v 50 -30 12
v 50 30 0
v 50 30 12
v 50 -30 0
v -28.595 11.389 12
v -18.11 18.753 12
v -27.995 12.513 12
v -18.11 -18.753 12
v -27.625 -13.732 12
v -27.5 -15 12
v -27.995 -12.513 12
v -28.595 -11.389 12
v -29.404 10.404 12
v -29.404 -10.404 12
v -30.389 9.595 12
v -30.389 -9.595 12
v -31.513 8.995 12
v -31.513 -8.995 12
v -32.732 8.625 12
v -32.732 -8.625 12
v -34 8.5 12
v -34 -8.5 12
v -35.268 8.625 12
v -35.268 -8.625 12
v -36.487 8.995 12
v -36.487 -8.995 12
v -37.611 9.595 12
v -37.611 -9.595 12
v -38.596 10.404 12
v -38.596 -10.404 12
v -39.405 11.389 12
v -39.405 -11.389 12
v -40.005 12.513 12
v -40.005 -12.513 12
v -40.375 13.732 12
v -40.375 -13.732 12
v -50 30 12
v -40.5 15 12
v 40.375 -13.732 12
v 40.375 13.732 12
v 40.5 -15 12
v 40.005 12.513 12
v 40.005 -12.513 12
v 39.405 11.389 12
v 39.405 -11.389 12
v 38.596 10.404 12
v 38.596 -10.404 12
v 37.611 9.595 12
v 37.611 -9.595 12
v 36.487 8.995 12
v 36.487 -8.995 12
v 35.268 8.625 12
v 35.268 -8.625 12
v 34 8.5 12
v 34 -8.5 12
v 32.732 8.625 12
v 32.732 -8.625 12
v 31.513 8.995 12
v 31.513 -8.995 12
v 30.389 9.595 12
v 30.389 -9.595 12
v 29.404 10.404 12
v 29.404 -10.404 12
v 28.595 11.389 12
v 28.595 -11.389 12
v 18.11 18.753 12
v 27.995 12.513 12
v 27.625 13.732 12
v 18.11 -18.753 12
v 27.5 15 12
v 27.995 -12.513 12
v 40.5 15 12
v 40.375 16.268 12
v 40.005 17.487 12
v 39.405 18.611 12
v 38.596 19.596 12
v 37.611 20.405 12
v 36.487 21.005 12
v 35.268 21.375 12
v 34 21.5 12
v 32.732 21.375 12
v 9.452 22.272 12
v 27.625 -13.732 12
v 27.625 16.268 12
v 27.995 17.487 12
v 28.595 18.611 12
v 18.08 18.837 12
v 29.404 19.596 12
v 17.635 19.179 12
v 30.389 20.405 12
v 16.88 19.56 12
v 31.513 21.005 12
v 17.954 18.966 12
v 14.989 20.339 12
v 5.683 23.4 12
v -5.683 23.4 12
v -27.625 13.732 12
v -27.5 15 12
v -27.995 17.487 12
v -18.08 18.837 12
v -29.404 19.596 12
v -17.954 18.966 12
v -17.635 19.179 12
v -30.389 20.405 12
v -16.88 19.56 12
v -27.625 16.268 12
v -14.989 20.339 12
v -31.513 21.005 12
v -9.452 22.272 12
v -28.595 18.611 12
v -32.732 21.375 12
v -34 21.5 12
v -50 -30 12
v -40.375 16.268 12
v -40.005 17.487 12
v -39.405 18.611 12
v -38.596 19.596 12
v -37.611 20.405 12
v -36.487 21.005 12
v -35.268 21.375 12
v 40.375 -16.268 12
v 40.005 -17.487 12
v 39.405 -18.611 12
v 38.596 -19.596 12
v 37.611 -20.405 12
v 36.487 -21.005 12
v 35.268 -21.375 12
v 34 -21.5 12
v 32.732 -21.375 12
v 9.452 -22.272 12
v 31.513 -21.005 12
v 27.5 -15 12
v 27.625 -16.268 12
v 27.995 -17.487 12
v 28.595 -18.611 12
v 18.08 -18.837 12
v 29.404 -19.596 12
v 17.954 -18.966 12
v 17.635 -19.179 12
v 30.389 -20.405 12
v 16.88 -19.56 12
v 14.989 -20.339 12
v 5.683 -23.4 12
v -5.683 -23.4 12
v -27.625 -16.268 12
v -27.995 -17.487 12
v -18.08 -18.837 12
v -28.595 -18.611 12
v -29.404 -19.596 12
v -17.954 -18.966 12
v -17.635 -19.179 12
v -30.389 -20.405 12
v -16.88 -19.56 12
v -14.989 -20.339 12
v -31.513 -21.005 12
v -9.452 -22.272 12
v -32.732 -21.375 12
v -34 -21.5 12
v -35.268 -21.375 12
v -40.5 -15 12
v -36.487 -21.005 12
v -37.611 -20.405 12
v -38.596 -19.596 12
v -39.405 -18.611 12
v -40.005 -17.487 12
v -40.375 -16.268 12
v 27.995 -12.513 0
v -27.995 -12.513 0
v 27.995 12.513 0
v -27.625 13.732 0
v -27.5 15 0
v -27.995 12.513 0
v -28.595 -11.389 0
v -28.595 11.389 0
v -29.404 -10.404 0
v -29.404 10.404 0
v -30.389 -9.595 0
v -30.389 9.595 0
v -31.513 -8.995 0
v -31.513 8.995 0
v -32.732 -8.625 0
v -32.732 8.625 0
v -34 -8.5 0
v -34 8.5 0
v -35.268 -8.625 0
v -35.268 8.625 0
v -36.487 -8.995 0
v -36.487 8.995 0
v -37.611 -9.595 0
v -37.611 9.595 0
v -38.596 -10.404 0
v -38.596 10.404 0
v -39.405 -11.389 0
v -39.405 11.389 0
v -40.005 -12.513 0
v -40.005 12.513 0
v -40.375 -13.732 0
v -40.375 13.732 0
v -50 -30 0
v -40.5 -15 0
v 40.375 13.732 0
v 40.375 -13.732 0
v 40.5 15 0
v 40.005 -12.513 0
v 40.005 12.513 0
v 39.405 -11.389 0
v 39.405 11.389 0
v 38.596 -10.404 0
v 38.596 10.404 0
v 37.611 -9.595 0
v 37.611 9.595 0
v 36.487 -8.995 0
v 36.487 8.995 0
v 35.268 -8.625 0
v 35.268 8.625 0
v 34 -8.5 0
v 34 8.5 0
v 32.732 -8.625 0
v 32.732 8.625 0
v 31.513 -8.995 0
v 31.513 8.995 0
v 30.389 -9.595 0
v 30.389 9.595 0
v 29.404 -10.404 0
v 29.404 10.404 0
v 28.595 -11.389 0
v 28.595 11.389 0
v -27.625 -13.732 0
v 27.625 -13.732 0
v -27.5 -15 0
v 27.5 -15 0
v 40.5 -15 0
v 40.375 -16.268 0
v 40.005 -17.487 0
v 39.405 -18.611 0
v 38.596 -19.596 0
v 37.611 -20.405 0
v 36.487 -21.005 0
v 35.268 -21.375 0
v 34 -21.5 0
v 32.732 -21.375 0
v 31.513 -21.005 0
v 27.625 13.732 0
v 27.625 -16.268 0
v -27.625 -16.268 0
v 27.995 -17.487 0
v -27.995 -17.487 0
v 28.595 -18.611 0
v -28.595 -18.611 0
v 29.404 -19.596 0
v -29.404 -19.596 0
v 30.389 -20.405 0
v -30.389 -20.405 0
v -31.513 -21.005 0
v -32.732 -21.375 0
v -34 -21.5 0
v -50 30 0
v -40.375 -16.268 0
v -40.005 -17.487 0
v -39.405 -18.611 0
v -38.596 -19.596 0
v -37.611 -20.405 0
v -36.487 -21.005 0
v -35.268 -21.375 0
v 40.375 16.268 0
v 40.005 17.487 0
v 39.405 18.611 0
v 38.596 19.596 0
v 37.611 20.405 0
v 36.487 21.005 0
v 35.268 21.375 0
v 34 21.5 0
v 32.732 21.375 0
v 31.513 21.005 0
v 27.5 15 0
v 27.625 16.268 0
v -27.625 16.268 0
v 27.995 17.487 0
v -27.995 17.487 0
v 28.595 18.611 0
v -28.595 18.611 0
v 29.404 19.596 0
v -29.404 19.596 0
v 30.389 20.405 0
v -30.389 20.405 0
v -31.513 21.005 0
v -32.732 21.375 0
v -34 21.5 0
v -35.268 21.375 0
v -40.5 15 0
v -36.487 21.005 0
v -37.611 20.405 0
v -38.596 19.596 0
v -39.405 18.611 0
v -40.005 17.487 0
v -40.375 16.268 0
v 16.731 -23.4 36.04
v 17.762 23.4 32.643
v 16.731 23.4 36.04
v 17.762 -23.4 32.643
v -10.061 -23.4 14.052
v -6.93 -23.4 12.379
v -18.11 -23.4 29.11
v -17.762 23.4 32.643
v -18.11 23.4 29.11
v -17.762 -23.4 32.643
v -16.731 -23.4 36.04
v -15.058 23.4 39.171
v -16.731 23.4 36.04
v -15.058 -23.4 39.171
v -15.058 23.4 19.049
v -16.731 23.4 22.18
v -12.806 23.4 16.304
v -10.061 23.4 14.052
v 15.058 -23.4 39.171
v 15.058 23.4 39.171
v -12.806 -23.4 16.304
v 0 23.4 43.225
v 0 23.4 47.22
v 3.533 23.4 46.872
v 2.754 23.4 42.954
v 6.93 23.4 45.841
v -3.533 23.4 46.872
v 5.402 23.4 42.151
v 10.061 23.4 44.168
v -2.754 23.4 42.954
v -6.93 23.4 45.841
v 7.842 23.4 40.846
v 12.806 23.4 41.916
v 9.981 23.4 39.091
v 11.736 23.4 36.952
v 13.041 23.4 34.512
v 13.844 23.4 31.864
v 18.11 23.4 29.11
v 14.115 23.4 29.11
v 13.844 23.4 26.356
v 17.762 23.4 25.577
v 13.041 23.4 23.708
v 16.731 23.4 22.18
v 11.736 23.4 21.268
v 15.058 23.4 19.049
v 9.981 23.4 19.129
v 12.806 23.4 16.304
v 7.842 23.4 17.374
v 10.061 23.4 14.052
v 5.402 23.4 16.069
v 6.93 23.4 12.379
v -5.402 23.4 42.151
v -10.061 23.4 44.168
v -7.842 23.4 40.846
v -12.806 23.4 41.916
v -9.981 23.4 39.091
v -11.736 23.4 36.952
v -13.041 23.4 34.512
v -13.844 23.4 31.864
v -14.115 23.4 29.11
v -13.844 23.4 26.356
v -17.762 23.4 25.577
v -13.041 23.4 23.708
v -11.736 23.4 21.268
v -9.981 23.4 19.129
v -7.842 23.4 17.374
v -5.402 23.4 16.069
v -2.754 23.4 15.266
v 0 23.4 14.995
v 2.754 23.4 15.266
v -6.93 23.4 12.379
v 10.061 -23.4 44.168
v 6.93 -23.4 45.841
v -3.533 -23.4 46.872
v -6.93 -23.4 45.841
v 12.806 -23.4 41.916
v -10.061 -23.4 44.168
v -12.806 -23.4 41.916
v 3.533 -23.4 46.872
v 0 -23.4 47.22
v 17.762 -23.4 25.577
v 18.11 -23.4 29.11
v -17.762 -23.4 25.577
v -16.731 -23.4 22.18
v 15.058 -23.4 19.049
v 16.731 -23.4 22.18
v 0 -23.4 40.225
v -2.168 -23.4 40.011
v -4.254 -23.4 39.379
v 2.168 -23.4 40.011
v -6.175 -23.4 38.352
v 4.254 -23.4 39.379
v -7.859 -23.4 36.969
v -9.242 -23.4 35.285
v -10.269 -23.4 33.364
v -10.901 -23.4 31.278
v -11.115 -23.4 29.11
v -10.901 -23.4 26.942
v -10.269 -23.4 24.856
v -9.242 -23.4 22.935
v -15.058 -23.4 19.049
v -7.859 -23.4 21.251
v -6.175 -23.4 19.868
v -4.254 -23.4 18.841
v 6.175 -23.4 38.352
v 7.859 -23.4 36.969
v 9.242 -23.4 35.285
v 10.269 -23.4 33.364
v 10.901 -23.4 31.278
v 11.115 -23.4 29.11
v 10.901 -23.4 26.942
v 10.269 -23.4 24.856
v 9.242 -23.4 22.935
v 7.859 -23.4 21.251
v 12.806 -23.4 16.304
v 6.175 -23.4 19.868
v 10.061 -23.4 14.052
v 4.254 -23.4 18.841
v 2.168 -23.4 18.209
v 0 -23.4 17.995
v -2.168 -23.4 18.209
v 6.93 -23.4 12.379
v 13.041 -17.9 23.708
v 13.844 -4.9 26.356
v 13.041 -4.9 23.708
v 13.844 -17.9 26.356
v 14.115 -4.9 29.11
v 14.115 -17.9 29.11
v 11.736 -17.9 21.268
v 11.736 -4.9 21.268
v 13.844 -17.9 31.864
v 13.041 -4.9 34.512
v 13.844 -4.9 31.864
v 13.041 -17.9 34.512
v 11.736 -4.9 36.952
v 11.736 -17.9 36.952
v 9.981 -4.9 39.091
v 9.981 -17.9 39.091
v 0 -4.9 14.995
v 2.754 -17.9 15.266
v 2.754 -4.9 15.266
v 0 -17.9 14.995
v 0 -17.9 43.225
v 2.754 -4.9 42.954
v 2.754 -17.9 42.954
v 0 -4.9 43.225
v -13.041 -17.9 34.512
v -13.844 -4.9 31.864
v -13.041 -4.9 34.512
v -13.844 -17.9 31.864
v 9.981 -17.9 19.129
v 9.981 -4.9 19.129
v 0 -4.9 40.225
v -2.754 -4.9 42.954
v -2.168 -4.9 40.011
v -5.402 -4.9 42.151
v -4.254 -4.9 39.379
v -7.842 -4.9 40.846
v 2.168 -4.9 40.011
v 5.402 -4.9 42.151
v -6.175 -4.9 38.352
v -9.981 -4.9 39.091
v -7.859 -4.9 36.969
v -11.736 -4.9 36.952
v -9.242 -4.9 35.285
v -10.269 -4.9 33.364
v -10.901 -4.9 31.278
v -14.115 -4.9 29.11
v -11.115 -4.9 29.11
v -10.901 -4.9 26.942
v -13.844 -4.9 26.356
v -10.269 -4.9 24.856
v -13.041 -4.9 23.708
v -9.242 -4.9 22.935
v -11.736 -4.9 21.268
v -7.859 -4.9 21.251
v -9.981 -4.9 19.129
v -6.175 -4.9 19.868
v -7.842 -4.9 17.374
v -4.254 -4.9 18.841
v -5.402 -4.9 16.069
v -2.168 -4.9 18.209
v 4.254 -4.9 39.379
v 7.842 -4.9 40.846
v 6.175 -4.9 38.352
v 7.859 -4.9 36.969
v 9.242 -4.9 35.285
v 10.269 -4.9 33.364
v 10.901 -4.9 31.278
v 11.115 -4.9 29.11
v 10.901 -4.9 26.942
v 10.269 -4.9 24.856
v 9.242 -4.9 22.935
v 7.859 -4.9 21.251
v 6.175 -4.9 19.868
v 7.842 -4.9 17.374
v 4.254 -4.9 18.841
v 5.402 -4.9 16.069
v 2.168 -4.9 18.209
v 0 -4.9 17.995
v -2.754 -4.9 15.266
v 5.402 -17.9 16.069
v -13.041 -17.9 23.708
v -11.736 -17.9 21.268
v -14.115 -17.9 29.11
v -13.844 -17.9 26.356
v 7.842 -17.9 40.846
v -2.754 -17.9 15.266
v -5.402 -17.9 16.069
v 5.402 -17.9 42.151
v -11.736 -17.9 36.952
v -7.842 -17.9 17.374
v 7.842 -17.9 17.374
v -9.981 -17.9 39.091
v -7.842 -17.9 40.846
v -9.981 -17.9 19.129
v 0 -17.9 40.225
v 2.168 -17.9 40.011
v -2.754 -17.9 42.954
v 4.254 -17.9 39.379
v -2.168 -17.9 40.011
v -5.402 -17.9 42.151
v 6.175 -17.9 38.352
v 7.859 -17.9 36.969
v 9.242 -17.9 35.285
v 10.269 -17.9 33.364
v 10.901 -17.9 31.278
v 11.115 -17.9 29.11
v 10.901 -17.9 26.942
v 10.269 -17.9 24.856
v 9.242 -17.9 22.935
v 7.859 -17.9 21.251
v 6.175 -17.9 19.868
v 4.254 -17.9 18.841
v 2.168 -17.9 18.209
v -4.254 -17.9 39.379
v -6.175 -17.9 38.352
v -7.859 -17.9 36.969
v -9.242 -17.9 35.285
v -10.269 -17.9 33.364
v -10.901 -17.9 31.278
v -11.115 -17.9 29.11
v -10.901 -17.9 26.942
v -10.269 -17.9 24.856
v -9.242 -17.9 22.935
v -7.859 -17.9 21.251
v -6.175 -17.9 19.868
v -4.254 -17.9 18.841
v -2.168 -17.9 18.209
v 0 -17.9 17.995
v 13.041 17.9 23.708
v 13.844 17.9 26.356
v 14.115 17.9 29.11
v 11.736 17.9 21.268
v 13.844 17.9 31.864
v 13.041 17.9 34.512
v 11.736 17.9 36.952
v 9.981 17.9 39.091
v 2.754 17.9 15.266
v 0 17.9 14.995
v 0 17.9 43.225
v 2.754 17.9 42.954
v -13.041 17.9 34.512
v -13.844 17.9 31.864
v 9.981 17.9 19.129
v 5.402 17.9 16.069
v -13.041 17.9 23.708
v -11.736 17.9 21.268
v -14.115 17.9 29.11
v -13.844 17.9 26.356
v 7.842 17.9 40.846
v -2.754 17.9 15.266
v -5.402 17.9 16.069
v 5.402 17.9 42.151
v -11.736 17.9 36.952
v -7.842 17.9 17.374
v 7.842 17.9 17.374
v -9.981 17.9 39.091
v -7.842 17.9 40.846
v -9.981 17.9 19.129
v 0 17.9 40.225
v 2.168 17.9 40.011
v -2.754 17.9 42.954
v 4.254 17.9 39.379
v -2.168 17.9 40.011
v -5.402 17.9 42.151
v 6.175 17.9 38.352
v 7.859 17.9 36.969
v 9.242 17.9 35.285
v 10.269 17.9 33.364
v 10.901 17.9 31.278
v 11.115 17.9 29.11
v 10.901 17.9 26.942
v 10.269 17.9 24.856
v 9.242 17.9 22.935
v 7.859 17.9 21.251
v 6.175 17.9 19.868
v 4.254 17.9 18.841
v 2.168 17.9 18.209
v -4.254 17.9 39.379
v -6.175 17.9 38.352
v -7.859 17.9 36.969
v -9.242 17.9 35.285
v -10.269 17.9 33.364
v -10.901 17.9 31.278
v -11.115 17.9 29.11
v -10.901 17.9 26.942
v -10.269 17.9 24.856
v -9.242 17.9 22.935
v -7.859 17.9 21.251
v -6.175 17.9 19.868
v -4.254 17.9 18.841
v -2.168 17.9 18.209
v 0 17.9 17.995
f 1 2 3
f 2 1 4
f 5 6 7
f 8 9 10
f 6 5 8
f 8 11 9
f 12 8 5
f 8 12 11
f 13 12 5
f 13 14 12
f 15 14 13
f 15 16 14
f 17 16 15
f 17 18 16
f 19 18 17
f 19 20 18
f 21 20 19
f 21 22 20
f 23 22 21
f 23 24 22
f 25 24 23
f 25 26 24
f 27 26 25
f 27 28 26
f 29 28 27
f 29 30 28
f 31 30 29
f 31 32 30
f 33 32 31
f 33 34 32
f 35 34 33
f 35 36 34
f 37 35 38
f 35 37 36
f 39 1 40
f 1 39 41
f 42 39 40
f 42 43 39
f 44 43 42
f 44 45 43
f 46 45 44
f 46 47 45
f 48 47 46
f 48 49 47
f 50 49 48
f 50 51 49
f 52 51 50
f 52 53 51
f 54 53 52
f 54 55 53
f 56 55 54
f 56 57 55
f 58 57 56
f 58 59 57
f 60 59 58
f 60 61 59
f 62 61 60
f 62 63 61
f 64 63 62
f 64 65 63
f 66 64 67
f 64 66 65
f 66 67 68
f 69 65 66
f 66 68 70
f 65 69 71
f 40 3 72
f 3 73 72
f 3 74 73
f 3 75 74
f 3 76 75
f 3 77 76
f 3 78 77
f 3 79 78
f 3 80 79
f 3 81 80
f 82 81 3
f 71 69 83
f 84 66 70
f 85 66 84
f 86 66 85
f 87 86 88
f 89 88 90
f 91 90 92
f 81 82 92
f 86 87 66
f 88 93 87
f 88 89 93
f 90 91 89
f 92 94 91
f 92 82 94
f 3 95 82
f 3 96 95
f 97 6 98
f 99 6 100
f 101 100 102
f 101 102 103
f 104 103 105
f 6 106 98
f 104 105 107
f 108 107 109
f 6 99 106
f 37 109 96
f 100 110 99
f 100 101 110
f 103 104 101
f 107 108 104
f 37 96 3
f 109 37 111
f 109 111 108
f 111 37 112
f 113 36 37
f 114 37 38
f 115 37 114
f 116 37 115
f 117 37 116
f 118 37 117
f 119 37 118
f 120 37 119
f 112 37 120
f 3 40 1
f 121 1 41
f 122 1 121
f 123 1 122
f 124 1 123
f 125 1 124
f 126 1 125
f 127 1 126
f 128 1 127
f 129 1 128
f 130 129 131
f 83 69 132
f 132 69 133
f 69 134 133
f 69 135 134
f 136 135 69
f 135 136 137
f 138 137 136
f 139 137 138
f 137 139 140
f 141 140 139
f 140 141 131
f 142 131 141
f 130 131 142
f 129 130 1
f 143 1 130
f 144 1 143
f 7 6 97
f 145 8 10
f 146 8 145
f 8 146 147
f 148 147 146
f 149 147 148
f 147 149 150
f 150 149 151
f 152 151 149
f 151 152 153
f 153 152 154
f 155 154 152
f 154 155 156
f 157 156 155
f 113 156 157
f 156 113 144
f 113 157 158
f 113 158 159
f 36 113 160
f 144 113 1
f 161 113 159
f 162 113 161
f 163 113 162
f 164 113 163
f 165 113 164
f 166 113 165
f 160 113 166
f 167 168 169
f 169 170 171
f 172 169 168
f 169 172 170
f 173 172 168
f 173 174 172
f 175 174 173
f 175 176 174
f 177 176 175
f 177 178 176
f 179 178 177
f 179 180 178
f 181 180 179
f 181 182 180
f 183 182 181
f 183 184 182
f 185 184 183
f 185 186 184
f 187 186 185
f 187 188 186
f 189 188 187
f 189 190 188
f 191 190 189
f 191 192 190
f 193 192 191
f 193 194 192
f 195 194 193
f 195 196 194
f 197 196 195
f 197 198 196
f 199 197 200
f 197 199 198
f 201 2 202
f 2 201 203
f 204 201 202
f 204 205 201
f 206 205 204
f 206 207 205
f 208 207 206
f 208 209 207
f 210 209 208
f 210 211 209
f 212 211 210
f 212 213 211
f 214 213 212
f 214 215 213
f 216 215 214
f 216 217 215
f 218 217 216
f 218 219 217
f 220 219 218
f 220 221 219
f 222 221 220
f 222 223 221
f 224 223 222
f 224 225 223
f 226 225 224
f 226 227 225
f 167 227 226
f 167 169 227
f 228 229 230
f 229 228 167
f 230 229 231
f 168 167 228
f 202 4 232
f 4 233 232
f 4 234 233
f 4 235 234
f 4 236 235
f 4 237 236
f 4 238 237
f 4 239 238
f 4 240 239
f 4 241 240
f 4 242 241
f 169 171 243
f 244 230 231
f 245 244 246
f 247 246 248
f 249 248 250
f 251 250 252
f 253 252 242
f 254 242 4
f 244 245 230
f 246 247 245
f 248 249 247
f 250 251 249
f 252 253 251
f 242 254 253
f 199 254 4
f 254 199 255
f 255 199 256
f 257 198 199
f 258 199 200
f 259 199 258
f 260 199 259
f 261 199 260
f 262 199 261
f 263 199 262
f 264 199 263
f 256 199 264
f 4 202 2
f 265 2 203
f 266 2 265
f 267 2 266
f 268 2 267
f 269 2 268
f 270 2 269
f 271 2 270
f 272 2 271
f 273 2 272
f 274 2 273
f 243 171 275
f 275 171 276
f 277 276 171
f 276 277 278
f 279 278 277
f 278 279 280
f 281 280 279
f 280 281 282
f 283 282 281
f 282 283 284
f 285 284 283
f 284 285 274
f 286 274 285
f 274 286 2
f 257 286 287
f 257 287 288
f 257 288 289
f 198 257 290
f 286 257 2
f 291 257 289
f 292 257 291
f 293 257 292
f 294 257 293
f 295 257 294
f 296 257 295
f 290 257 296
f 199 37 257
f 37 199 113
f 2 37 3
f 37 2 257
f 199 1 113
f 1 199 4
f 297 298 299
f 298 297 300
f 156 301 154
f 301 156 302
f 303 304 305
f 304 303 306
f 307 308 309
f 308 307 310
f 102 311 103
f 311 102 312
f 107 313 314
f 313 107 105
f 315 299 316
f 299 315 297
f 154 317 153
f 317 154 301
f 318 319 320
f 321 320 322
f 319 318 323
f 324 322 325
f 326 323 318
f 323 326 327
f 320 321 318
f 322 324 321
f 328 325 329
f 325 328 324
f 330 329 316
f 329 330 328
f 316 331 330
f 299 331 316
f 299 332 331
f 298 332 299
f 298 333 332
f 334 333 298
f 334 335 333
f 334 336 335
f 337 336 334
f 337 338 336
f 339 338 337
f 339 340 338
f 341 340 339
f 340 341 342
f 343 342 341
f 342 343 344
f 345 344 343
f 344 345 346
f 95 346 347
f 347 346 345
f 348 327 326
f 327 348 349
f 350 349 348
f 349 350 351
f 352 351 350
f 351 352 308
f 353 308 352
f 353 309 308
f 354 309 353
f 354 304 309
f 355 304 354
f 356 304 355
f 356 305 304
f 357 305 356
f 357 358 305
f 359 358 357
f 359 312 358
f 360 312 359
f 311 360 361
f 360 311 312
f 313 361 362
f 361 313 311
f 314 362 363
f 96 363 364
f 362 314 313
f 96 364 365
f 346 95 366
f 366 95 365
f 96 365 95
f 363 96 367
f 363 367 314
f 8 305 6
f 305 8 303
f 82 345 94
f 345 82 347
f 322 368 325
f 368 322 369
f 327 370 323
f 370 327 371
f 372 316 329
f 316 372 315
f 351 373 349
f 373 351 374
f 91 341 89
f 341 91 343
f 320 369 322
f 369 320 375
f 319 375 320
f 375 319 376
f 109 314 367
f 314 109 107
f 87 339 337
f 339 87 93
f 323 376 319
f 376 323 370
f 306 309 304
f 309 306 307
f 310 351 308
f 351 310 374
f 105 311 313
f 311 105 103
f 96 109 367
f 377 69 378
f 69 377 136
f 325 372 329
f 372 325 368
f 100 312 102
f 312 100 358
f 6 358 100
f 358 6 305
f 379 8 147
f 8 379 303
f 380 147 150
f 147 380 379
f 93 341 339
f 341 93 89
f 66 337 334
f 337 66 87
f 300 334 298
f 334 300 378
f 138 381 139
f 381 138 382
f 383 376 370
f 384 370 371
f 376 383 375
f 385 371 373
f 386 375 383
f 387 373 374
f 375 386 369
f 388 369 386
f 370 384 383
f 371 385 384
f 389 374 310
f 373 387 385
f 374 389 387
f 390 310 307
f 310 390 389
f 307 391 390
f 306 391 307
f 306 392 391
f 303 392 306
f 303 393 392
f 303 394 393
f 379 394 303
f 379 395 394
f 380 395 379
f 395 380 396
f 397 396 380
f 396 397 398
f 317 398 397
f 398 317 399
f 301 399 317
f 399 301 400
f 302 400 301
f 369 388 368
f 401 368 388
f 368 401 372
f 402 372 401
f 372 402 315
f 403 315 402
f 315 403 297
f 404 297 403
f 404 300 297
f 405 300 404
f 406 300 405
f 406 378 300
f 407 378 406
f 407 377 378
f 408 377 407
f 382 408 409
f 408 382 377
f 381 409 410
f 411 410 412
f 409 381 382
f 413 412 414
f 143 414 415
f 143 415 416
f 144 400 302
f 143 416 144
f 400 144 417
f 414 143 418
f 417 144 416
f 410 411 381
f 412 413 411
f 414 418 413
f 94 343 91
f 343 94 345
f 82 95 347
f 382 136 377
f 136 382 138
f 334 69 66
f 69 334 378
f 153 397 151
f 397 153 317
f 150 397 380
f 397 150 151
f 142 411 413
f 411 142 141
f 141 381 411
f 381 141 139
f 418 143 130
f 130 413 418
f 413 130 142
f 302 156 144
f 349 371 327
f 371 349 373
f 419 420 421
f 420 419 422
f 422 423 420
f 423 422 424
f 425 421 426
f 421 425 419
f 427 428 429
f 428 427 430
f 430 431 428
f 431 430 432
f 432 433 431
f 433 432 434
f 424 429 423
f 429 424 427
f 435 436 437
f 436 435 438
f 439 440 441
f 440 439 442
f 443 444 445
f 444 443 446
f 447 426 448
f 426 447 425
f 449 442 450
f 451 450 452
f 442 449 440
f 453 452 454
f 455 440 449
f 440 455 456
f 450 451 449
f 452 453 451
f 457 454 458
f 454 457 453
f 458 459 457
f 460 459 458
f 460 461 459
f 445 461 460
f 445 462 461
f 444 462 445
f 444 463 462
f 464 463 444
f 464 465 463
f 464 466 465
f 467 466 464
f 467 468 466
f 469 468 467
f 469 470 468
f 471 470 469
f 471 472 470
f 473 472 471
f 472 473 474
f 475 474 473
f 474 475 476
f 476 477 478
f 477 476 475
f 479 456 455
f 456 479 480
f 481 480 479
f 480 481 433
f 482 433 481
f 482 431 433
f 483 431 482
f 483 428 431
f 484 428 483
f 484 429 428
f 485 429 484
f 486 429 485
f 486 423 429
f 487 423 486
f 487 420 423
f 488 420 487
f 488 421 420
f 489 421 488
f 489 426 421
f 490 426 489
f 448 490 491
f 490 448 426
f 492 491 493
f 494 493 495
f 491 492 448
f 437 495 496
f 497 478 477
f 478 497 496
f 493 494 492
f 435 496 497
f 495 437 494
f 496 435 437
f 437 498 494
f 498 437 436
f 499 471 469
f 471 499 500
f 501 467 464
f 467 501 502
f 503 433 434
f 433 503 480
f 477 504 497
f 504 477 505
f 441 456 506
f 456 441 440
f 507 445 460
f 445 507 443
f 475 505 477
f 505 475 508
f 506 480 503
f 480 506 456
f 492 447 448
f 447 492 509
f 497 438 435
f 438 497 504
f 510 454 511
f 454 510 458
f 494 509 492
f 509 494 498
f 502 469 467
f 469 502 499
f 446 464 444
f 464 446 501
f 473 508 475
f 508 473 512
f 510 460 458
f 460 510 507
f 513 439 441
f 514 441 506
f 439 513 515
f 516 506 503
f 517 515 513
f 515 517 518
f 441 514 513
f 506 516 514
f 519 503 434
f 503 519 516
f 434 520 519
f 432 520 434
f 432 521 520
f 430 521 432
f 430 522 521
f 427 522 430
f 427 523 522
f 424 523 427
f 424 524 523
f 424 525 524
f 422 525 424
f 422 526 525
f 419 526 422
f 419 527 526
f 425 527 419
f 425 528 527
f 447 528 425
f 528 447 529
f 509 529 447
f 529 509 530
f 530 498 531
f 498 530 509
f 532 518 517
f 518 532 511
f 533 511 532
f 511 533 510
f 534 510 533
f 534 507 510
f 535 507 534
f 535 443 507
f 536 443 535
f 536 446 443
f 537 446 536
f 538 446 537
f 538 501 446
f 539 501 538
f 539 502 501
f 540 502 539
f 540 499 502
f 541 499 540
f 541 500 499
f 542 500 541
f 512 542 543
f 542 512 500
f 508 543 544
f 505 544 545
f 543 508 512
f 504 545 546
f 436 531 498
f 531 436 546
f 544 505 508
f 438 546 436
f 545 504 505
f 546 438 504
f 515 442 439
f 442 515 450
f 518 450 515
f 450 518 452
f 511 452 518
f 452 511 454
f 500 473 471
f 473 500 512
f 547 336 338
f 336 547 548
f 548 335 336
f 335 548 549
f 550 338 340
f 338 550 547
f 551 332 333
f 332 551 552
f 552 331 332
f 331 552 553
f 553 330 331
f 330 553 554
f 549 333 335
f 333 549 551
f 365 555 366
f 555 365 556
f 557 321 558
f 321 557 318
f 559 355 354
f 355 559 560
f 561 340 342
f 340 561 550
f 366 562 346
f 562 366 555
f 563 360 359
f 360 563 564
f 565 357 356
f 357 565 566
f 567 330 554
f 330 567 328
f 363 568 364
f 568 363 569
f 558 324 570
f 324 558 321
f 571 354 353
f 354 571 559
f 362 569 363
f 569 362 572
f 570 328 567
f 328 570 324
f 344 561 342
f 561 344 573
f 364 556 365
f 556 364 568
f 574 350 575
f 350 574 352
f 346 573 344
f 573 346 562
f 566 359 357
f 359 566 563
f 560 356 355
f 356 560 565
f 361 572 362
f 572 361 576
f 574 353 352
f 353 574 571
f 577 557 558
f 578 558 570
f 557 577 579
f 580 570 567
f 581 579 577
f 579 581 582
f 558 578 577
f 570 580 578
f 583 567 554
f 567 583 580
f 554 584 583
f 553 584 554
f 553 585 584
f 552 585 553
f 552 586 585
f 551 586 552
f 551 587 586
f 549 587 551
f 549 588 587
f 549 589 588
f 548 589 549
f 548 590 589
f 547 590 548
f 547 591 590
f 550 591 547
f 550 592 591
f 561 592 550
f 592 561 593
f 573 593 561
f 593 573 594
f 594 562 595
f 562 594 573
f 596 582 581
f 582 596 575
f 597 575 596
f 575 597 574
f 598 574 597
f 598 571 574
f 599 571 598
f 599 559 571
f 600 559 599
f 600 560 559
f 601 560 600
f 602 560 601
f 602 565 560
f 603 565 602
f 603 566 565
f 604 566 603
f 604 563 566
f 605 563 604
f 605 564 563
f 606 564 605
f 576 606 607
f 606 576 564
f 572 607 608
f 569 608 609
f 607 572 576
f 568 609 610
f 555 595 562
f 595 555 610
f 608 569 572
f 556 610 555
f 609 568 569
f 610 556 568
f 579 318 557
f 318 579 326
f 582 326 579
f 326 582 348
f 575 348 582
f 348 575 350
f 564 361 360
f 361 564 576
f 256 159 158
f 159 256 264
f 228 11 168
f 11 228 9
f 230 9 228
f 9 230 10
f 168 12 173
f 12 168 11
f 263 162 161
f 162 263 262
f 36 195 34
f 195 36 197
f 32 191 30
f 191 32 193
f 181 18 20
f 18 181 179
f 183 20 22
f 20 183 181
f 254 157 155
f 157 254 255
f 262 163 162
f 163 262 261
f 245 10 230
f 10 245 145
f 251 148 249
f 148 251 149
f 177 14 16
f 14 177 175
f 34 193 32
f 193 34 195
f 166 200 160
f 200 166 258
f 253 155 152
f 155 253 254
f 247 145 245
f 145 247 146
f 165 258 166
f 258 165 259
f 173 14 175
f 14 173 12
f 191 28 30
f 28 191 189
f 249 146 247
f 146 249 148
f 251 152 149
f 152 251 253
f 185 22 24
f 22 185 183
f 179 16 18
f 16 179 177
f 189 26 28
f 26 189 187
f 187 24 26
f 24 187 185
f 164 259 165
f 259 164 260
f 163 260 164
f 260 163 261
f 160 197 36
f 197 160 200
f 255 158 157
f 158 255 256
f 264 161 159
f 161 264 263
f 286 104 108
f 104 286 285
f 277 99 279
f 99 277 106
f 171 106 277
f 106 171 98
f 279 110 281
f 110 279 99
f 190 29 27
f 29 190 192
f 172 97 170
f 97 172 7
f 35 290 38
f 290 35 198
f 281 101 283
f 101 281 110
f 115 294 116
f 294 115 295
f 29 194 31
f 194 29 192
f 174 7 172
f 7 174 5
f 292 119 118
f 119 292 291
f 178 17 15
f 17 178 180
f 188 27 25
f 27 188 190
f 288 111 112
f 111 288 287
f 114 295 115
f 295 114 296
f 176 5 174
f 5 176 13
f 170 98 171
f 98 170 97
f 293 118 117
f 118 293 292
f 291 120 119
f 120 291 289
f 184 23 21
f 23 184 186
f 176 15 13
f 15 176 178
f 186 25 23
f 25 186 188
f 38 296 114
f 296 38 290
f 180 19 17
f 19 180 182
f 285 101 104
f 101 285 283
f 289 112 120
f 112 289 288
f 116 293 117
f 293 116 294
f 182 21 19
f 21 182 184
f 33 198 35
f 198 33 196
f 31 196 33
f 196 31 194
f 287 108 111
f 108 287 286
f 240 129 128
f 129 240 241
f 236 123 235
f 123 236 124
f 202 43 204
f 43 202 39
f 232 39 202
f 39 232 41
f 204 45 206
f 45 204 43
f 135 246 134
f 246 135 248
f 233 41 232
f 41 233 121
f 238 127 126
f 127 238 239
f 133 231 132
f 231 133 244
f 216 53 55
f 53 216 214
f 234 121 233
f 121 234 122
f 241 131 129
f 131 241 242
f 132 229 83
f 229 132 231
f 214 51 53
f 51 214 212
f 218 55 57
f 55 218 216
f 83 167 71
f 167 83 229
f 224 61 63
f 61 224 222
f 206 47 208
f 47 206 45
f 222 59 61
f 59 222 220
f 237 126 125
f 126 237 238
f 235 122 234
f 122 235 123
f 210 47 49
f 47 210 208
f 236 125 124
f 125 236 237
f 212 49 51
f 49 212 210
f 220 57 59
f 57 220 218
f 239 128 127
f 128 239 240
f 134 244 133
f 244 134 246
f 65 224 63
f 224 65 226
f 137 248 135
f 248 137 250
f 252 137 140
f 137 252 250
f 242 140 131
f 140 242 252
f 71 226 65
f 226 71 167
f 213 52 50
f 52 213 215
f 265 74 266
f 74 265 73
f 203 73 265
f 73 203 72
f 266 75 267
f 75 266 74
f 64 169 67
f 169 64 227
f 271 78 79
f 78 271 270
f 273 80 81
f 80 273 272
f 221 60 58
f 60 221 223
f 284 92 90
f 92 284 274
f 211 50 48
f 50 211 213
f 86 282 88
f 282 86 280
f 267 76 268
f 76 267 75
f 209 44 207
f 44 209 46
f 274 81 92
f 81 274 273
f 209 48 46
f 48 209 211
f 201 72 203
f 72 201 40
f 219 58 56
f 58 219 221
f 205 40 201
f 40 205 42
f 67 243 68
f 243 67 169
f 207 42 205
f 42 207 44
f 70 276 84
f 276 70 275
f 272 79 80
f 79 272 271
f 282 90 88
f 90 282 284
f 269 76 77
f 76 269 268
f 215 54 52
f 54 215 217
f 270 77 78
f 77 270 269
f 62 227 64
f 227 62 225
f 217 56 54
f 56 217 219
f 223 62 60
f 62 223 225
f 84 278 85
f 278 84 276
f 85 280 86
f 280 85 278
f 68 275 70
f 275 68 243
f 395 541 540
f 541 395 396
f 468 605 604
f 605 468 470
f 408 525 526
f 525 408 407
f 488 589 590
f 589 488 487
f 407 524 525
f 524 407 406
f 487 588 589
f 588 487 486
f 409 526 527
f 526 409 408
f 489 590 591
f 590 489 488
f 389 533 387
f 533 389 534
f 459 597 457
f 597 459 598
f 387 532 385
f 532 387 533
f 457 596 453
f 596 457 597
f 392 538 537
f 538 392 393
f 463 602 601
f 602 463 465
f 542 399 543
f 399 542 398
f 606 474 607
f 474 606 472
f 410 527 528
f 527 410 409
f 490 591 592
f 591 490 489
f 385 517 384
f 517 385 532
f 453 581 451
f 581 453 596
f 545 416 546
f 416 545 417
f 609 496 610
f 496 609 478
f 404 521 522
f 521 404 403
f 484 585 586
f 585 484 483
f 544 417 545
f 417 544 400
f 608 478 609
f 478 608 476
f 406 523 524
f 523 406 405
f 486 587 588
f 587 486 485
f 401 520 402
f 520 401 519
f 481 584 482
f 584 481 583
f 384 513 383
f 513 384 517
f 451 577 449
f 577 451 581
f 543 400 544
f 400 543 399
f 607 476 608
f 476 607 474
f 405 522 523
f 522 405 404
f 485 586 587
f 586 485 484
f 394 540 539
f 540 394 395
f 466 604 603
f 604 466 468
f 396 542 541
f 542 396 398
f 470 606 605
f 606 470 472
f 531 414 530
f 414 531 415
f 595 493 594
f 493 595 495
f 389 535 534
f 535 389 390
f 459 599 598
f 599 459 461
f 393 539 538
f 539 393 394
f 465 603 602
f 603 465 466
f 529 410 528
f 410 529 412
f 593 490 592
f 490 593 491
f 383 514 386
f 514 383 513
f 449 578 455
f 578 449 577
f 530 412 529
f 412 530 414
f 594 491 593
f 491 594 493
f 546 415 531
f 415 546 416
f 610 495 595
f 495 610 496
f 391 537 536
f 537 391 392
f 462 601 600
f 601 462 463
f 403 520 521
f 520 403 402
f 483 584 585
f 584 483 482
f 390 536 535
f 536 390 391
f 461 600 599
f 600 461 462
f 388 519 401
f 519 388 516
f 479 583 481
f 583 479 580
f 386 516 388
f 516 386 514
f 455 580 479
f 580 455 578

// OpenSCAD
$fn = 32;

// ----------------------------------------------------------------------
// Bearing block: 100 x 60 mm base, 22.23 mm bore at 29.11 mm
// ----------------------------------------------------------------------

// --- parameters (mm) ---
base_w = 100;             // base width
base_d = 60;              // base depth
base_t = 12;              // base thickness
bore_d = 22.23;           // shaft / bearing bore
house_r = 18.11;          // housing outer radius
house_len = 46.8;         // housing length along the shaft
foot_w = 36.22;           // foot width under the housing
foot_len = 36.8;          // foot length along the shaft
axis_z = 29.11;           // bore axis height above the base
holes_d = 13;             // mounting holes
hole_x = 34;              // mounting hole spacing
seat_d = 8;               // bearing seat depth
seat_wall = 3;            // seat wall thickness

difference() {
  union() {
    /* base plate with its underside on z = 0 */
    translate([0, 0, base_t / 2]) cube([base_w, base_d, base_t], center = true);
    /* hull foot: a straight web blending into the round housing */
    hull() {
      translate([0, 0, base_t - 0.5]) cube([foot_w, foot_len, 1.6], center = true);
      translate([0, 0, axis_z]) rotate([-90, 0, 0]) cylinder(h = house_len, d = 2 * house_r, center = true);
    }
  }
  /* bore through the housing, 2.5 mm clear on both sides */
  translate([0, 0, axis_z]) rotate([-90, 0, 0]) cylinder(h = house_len + 5, d = bore_d, center = true);
  /* bearing seats, recessed into both ends of the housing */
  for (sy = [-1, 1]) {
    translate([0, sy * (house_len / 2 - seat_d + 2.5), axis_z]) rotate([-90, 0, 0]) cylinder(h = seat_d + 5, d = bore_d + 2 * seat_wall);
  }
  /* mounting holes through the base plate */
  for (hx = [-34, 34]) {
    for (hy = [-15, 15]) {
      translate([hx, hy, -2.5]) cylinder(h = base_t + 5, d = holes_d);
    }
  }
}
